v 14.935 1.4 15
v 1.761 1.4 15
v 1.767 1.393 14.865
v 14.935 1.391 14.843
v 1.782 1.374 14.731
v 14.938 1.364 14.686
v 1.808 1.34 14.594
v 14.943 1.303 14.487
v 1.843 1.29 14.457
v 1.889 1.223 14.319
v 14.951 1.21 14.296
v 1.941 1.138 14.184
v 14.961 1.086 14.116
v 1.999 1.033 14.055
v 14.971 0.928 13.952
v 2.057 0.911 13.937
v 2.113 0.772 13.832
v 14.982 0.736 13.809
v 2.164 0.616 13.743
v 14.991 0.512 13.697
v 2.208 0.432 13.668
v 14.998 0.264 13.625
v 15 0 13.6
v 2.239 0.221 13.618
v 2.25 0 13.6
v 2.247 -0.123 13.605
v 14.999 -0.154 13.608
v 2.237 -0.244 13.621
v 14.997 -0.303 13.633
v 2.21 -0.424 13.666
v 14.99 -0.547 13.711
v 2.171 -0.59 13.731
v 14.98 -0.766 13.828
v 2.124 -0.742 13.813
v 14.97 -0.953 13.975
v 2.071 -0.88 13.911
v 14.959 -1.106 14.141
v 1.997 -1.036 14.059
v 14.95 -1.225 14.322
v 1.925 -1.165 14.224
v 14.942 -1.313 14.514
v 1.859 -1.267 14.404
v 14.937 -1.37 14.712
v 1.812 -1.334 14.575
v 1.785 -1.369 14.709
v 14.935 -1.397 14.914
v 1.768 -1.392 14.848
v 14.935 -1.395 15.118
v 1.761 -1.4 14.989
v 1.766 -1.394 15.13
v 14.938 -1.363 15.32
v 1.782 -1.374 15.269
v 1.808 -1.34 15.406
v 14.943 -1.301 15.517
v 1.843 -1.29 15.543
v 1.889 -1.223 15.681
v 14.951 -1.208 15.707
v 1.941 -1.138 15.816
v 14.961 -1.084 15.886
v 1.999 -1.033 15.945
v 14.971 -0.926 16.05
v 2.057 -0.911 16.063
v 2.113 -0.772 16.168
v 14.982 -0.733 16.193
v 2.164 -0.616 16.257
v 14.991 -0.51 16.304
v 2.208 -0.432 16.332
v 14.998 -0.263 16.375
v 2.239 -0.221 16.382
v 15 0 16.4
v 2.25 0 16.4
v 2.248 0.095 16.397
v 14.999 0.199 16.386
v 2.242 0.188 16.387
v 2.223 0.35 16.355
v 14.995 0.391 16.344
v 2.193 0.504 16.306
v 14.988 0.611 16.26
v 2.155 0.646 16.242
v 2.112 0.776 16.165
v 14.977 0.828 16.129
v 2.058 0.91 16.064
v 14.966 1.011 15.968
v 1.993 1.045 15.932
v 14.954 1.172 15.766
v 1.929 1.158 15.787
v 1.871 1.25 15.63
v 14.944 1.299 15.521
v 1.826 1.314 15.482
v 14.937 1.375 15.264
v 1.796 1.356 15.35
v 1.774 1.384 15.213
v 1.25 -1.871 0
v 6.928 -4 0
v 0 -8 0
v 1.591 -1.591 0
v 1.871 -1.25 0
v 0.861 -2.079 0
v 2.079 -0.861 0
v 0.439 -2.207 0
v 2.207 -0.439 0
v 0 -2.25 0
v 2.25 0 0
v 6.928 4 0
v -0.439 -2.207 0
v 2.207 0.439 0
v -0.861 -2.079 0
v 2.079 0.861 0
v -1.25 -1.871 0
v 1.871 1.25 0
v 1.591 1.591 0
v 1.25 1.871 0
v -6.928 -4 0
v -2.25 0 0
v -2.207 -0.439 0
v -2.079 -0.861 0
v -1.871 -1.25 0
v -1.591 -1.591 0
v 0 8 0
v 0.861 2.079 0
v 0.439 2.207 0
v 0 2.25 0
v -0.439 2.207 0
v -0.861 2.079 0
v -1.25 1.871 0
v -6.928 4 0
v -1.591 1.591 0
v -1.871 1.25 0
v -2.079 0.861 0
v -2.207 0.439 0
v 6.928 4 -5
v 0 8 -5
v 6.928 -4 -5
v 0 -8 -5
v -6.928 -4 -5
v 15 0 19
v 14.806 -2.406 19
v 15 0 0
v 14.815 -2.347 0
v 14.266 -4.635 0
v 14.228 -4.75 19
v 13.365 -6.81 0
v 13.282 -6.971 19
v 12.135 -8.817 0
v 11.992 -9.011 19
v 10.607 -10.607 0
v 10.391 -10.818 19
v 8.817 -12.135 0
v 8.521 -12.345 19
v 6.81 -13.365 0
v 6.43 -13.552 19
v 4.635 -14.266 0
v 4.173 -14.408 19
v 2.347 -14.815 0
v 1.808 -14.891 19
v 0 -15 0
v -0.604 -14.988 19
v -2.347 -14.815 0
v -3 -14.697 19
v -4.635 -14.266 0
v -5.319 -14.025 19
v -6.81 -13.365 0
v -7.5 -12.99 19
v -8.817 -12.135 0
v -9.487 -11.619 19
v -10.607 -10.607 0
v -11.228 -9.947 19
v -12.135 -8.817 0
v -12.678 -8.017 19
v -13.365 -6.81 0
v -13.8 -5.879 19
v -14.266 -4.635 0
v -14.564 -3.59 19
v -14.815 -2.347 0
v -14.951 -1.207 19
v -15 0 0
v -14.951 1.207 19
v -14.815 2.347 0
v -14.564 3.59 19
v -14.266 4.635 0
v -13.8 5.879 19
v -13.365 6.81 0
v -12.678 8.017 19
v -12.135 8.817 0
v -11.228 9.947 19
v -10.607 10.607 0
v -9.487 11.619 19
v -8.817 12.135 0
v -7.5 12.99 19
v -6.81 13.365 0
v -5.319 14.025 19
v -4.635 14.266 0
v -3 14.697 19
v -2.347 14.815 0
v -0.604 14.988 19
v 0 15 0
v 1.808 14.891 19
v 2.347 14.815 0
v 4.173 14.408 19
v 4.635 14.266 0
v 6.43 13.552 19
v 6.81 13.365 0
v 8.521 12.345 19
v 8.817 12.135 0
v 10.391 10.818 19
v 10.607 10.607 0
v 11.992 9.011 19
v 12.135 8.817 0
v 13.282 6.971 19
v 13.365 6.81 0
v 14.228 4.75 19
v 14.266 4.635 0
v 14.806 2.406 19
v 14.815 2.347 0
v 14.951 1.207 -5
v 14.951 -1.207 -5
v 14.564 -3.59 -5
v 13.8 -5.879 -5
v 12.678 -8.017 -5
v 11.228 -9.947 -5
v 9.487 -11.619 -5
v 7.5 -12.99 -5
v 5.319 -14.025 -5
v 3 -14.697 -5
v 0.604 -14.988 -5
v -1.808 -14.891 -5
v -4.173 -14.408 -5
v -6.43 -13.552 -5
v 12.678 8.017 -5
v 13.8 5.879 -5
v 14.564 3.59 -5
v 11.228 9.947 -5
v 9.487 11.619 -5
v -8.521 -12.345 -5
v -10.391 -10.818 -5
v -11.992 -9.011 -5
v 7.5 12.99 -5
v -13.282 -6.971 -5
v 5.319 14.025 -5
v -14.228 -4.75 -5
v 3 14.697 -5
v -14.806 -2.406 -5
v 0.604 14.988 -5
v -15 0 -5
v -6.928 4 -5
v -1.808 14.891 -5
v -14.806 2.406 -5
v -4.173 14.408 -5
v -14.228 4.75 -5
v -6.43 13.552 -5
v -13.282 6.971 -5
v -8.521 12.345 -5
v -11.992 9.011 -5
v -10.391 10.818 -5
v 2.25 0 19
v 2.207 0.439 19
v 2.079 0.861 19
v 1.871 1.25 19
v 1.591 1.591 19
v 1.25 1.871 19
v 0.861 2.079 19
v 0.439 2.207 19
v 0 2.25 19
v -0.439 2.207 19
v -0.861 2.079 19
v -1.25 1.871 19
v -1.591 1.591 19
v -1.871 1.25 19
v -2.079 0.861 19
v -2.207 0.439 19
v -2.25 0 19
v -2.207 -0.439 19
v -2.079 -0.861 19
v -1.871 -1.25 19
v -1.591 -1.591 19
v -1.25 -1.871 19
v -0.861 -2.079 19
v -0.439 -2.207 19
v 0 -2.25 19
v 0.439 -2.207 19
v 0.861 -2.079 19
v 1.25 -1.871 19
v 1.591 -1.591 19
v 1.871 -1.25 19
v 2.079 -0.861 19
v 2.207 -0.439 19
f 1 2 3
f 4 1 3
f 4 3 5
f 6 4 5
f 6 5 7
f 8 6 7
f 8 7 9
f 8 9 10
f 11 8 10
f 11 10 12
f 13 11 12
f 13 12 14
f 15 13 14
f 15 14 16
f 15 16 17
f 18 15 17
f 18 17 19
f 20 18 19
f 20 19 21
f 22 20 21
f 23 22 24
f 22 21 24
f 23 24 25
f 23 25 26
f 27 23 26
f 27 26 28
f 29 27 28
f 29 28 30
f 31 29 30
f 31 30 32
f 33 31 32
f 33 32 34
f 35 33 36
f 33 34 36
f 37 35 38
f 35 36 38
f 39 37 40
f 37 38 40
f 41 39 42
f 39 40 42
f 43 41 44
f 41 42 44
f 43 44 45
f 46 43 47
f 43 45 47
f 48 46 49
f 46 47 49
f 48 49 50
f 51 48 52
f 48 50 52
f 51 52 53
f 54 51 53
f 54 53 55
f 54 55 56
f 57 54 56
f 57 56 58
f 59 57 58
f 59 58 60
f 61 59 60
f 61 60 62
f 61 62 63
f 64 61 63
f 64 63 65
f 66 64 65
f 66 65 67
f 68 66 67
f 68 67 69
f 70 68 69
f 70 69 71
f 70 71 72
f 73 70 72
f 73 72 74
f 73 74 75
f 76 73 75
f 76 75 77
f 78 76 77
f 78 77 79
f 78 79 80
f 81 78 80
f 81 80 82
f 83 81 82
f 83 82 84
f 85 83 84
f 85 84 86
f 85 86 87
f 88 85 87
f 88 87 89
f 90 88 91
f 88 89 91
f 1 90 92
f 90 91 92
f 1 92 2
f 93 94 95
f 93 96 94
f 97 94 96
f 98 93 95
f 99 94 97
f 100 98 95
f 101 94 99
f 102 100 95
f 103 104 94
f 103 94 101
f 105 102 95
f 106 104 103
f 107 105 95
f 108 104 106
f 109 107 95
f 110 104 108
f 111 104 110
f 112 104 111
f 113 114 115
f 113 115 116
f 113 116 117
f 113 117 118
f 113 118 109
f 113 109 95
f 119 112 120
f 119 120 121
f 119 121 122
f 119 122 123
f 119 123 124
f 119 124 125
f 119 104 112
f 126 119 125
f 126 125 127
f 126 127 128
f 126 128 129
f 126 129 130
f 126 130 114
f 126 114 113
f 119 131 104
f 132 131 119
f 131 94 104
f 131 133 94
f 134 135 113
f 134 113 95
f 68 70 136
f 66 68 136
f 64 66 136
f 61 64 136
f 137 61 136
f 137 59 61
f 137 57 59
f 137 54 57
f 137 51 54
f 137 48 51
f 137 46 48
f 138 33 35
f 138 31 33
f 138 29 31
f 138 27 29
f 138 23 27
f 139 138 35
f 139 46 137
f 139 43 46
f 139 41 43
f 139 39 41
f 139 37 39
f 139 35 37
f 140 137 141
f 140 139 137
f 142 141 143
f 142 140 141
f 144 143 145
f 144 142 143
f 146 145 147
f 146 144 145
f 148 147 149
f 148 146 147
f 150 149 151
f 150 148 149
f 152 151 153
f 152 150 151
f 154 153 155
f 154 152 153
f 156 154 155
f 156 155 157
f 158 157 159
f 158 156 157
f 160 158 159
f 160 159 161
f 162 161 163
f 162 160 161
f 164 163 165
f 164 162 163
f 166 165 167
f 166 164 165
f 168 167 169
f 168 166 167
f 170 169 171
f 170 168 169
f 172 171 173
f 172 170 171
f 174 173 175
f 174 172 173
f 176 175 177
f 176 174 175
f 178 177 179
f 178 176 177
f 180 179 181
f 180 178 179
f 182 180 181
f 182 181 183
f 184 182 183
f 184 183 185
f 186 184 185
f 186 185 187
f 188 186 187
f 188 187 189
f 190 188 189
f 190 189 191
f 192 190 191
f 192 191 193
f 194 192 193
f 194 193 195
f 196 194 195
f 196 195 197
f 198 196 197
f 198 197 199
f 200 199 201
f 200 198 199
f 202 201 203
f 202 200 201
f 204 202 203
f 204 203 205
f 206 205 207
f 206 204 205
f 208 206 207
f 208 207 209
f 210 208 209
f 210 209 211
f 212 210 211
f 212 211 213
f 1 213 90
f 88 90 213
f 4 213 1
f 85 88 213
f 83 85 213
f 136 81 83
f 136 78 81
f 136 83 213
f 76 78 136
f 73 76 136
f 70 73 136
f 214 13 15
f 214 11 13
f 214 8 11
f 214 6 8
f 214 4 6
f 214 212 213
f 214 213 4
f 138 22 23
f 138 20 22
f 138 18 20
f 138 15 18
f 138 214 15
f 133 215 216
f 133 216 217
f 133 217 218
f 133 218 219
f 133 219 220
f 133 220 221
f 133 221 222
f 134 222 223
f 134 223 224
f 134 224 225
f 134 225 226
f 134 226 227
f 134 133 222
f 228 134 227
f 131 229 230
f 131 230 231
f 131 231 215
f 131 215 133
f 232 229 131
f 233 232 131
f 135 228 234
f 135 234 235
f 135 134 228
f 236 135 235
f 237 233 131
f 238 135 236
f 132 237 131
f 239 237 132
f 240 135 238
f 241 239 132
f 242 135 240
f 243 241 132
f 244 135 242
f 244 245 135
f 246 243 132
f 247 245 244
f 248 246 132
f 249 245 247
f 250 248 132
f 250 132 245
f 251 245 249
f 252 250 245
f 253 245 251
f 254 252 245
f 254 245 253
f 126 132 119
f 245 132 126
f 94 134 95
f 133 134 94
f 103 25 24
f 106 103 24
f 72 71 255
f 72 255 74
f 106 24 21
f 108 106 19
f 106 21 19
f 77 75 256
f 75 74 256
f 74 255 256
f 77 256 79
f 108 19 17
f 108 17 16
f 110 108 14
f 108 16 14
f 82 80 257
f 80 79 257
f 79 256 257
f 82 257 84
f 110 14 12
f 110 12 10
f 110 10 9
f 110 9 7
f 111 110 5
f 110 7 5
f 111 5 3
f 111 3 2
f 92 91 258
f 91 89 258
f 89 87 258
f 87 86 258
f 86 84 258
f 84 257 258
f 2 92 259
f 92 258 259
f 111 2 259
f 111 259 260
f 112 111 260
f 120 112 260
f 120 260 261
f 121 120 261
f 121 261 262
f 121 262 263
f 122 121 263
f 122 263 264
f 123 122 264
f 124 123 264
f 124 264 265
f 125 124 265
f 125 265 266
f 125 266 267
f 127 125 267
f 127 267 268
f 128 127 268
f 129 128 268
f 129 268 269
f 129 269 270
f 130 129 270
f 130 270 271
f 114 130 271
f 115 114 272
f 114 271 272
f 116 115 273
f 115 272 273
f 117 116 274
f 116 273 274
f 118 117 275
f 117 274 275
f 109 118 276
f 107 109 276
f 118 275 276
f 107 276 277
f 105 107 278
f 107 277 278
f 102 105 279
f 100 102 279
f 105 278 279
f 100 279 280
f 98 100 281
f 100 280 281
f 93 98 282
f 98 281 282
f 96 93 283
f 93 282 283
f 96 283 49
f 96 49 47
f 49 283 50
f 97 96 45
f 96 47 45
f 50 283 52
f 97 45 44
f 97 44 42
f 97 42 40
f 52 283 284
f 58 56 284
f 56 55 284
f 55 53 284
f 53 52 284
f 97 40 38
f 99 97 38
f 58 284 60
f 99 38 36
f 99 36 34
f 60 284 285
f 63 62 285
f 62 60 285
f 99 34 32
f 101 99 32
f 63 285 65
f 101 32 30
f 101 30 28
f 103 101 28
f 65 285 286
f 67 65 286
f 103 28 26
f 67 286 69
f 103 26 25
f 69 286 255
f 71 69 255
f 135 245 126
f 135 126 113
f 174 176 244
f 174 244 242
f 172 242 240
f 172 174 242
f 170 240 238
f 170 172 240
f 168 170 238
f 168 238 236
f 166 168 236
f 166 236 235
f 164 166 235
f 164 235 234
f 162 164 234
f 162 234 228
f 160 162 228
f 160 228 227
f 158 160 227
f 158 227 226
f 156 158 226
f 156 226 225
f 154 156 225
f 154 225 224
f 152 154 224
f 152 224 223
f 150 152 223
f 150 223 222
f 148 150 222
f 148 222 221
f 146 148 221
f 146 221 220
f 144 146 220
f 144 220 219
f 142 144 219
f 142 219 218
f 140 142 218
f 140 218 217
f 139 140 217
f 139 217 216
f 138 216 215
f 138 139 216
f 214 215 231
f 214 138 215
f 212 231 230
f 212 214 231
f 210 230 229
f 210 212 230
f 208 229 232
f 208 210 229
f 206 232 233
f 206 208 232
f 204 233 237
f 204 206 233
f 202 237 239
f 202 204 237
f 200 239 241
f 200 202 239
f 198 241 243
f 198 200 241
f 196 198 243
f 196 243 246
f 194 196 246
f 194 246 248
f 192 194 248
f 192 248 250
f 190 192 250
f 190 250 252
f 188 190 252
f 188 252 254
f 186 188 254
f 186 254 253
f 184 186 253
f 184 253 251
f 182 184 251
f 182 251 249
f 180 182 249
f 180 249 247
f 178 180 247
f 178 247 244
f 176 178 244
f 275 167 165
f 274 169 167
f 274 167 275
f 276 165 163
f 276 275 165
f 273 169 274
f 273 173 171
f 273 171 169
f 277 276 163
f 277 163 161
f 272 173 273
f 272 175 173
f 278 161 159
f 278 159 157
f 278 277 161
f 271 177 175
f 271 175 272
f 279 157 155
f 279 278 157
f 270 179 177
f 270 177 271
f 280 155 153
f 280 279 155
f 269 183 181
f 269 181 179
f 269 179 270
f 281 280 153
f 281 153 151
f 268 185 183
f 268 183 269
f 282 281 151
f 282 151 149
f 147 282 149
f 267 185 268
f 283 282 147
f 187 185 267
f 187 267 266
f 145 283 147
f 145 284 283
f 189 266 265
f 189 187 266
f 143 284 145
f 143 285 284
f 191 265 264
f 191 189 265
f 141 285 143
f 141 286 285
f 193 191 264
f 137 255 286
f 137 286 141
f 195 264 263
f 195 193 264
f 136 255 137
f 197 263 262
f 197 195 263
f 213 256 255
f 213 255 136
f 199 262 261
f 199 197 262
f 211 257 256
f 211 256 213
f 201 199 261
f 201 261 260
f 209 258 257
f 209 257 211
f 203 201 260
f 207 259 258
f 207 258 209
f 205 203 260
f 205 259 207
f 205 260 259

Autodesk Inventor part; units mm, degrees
ref_plane "YZ Plane" through (0, 0, 0) normal (1, 0, 0) x (0, 1, 0)
ref_plane "XZ Plane" through (0, 0, 0) normal (0, 1, 0) x (-1, 0, 0)
ref_plane "XY Plane" through (0, 0, 0) normal (0, 0, 1) x (1, 0, 0)
sketch "Sketch1" plane through (0, 0, 0) normal (0, 0, 1) x (1, 0, 0)
  circle A0 centre (0, 0) radius 15
  dimension "d0" = 30
extrude "Extrusion1" add sketch "Sketch1" along normal blind 19
sketch "Sketch2" plane through (0, 0, 19) normal (0, 0, 1) x (1, 0, 0)
  circle A0 centre (0, 0) radius 2.25
  dimension "d3" = 4.5
extrude "Extrusion2" cut sketch "Sketch2" against normal blind 19
sketch "Sketch3" plane through (0, 0, 0) normal (0, 0, -1) x (-1, 0, 0)
  circle A0 centre (0, 0) radius 15 projected
extrude "Extrusion3" add sketch "Sketch3" along normal blind 5
sketch "Sketch6" plane through (0, 0, -5) normal (0, 0, -1) x (-1, 0, 0)
  line L0 (0, -8) -> (-6.9282, -4)
  line L1 (-6.9282, -4) -> (-6.9282, 4)
  line L2 (-6.9282, 4) -> (0, 8)
  line L3 (0, 8) -> (6.9282, 4)
  line L4 (6.9282, 4) -> (6.9282, -4)
  line L5 (6.9282, -4) -> (0, -8)
  point P0 (0, 0)
  point P1 (0, 0)
  dimension "d15" = 16
extrude "Extrusion6" cut sketch "Sketch6" against normal blind 5
sketch "Sketch7" plane through (0, 0, 0) normal (1, 0, 0) x (0, 1, 0)
  circle A0 centre (0, 15) radius 1.4
  line L0 (15, 19) -> (-15, 19) projected
  point P0 (0, 0)
  dimension "d18" = 2.8
  dimension "d22" = 4
extrude "Extrusion7" cut sketch "Sketch7" along normal through all
properties part number "AA009" material "ABS Plastic"
